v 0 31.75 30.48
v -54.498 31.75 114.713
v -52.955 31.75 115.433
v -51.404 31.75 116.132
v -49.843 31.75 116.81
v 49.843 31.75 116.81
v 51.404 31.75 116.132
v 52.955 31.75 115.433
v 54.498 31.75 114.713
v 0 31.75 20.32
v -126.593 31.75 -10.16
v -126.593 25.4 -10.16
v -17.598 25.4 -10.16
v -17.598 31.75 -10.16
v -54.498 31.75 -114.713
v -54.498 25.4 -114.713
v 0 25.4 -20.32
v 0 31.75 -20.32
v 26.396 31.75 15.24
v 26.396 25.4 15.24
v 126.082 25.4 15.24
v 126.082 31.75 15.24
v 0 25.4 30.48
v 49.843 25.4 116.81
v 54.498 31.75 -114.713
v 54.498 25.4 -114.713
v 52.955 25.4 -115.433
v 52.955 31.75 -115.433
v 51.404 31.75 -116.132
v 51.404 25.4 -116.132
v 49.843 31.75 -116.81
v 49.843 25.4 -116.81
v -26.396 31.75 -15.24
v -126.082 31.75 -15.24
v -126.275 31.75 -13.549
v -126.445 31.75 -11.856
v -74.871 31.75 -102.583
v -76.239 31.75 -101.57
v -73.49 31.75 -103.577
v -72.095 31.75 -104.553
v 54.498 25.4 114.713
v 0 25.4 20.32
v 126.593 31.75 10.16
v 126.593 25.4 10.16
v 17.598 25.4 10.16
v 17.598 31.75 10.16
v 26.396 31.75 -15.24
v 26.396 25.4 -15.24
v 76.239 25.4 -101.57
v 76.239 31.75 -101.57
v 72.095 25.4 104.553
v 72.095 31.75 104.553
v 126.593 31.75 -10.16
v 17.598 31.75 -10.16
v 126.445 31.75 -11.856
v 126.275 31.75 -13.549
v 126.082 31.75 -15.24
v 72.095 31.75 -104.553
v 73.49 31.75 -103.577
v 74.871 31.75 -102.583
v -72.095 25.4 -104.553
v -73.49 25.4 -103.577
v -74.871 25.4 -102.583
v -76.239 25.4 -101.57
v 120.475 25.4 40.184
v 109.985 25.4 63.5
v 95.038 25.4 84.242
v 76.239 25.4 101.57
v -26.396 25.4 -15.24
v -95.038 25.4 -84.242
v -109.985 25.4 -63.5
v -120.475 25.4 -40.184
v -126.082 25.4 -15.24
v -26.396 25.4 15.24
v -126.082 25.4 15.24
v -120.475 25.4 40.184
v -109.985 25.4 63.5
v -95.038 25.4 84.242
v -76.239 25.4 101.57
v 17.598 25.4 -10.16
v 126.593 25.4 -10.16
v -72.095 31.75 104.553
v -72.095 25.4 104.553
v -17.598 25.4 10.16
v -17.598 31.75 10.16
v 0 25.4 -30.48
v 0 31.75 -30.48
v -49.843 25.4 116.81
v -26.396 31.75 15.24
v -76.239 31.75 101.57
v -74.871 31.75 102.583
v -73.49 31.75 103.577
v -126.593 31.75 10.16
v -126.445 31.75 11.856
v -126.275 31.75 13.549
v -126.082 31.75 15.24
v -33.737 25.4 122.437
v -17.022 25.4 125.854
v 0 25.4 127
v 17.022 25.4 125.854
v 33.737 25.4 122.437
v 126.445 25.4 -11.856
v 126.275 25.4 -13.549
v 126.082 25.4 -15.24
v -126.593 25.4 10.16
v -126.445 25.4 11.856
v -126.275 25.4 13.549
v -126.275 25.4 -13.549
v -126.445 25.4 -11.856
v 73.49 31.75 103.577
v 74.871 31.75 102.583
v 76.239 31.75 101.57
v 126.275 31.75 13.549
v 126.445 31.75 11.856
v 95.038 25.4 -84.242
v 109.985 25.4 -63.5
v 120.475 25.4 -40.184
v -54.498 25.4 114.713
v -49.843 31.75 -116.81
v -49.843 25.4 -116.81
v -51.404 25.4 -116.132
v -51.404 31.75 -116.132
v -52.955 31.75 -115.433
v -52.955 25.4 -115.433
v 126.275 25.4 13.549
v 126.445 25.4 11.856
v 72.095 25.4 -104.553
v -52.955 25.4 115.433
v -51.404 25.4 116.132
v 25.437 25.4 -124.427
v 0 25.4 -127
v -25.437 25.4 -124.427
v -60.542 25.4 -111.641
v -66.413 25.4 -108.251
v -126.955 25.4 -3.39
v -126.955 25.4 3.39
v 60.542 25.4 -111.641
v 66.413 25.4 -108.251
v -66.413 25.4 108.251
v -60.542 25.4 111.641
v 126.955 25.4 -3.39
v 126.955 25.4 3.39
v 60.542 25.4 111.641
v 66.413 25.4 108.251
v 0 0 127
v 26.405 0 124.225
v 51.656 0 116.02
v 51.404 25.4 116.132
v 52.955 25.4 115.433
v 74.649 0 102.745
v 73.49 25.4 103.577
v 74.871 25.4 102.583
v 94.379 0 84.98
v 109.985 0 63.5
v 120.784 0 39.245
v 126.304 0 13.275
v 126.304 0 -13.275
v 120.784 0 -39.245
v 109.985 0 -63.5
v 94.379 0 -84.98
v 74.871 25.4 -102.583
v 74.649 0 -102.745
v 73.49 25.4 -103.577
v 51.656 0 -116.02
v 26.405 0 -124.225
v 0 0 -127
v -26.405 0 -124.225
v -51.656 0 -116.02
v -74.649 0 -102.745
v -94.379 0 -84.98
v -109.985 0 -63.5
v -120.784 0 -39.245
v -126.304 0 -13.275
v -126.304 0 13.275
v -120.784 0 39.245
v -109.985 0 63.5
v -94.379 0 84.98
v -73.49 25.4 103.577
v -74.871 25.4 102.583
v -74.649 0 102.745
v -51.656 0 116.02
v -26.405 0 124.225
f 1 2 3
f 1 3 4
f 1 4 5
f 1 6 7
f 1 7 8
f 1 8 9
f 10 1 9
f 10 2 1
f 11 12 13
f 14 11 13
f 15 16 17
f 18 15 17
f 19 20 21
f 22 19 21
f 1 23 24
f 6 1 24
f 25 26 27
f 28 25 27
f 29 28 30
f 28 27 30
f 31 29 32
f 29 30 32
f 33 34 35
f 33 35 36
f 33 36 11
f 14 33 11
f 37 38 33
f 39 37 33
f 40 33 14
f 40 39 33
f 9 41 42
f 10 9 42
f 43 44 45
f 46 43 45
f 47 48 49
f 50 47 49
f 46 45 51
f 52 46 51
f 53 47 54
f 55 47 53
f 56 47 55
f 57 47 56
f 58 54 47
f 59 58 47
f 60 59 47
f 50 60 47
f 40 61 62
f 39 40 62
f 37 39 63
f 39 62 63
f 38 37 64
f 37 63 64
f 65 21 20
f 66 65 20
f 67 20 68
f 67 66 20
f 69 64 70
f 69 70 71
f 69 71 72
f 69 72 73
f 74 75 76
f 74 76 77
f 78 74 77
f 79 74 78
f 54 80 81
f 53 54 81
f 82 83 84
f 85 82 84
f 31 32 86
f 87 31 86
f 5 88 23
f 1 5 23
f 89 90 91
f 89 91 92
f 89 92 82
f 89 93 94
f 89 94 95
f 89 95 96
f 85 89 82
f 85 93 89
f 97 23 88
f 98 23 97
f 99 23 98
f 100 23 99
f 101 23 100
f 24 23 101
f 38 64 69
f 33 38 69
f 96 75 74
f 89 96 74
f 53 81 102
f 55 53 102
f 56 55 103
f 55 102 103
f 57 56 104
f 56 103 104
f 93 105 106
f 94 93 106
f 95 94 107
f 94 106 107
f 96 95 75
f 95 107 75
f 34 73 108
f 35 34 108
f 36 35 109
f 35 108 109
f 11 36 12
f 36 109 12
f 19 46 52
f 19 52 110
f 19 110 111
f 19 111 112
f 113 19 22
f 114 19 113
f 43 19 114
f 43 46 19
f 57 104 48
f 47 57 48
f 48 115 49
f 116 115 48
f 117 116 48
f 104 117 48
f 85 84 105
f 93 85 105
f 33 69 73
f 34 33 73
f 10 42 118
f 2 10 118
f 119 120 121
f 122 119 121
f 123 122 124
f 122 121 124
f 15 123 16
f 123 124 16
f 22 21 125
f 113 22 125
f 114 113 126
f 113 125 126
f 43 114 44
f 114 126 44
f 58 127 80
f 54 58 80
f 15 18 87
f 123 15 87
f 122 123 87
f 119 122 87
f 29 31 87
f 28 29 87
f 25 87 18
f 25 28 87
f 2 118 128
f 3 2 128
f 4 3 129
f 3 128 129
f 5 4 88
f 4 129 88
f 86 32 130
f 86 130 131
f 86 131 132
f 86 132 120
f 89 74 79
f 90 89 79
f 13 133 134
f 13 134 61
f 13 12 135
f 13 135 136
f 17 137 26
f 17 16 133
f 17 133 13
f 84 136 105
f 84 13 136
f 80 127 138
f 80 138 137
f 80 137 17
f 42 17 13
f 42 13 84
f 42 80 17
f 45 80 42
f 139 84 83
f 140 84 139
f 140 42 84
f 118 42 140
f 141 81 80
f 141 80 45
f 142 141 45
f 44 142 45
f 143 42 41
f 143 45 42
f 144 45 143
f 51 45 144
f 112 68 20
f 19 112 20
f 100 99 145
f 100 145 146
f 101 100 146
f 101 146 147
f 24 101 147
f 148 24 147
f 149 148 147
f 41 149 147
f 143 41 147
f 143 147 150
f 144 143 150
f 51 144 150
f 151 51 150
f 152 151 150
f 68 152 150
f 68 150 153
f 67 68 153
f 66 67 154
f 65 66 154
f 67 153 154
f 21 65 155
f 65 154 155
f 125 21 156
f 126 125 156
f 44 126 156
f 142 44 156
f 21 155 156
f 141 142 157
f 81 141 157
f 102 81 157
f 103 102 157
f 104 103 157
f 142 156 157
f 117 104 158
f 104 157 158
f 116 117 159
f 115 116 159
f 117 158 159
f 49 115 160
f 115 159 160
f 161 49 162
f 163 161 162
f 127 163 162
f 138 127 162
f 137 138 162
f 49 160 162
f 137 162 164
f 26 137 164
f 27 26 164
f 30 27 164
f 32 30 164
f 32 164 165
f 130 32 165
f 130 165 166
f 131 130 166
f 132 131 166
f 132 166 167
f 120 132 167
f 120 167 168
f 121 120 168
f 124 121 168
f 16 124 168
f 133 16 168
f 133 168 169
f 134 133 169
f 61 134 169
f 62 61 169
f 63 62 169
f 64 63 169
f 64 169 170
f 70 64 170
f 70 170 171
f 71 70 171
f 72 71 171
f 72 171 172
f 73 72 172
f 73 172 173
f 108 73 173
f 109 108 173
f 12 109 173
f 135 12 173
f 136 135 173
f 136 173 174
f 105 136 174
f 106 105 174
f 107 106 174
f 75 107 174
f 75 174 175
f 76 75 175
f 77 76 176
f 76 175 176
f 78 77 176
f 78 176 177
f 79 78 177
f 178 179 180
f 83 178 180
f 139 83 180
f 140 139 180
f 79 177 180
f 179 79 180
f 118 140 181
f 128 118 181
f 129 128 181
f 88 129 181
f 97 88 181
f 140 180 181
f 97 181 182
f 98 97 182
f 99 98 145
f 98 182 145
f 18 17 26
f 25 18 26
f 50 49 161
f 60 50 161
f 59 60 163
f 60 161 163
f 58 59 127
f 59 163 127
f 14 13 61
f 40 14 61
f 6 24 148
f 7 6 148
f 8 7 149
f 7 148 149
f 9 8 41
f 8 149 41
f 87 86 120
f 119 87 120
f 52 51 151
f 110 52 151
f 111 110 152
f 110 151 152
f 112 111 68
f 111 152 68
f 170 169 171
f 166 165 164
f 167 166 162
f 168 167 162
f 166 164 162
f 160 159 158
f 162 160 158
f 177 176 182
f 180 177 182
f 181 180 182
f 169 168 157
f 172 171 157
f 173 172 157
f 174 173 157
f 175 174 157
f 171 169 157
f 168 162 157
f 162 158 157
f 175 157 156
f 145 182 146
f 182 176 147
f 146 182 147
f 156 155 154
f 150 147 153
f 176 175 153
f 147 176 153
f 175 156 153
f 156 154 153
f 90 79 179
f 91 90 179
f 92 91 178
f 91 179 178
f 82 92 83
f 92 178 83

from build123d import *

# Parameters (mm, degrees)
SKETCH1_R           = 127
BOSS_EXTRUDE1_DEPTH = 25.4
BOSS_EXTRUDE2_DEPTH = 6.35


with BuildPart() as part:
    # Sketch1 → Boss-Extrude1 (new body)
    with BuildSketch(Plane(origin=(0, 0, 0), x_dir=(1, 0, 0), z_dir=(0, 1, 0))):
        with Locations(Location((0, 0, 0), (0, 0, 270))):
            Circle(SKETCH1_R)
    extrude(amount=BOSS_EXTRUDE1_DEPTH)

    # Sketch2 → Boss-Extrude2 (add)
    with BuildSketch(Plane(origin=(0, 25.4, 0), x_dir=(1, 0, 0), z_dir=(0, 1, 0))):
        with BuildLine():
            Line((-126.592947671, 10.16), (-17.597636205, 10.16))
            Line((-17.597636205, 10.16), (-72.095291938, 104.552708623))
            ThreePointArc((-72.095291938, 104.552708623), (-74.182318509, 103.082411791), (-76.239369275, 101.570461122))
            Line((-76.239369275, 101.570461122), (-26.396454307, 15.24))
            Line((-26.396454307, 15.24), (-126.082284243, 15.24))
            ThreePointArc((-126.082284243, 15.24), (-126.363146549, 12.702566445), (-126.592947671, 10.16))
        make_face()
        with BuildLine():
            Line((-126.082284243, -15.24), (-26.396454307, -15.24))
            Line((-26.396454307, -15.24), (-76.239369275, -101.570461122))
            ThreePointArc((-76.239369275, -101.570461122), (-74.182318509, -103.082411791), (-72.095291938, -104.552708623))
            Line((-72.095291938, -104.552708623), (-17.597636205, -10.16))
            Line((-17.597636205, -10.16), (-126.592947671, -10.16))
            ThreePointArc((-126.592947671, -10.16), (-126.363146549, -12.702566445), (-126.082284243, -15.24))
        make_face()
        with BuildLine():
            Line((54.497655733, -114.712708623), (0, -20.32))
            Line((0, -20.32), (-54.497655733, -114.712708623))
            ThreePointArc((-54.497655733, -114.712708623), (-52.18082804, -115.784978236), (-49.842914968, -116.810461122))
            Line((-49.842914968, -116.810461122), (0, -30.48))
            Line((0, -30.48), (49.842914968, -116.810461122))
            ThreePointArc((49.842914968, -116.810461122), (52.18082804, -115.784978236), (54.497655733, -114.712708623))
        make_face()
        with BuildLine():
            Line((76.239369275, -101.570461122), (26.396454307, -15.24))
            Line((26.396454307, -15.24), (126.082284243, -15.24))
            ThreePointArc((126.082284243, -15.24), (126.363146549, -12.702566445), (126.592947671, -10.16))
            Line((126.592947671, -10.16), (17.597636205, -10.16))
            Line((17.597636205, -10.16), (72.095291938, -104.552708623))
            ThreePointArc((72.095291938, -104.552708623), (74.182318509, -103.082411791), (76.239369275, -101.570461122))
        make_face()
        with BuildLine():
            Line((72.095291938, 104.552708623), (17.597636205, 10.16))
            Line((17.597636205, 10.16), (126.592947671, 10.16))
            ThreePointArc((126.592947671, 10.16), (126.363146549, 12.702566445), (126.082284243, 15.24))
            Line((126.082284243, 15.24), (26.396454307, 15.24))
            Line((26.396454307, 15.24), (76.239369275, 101.570461122))
            ThreePointArc((76.239369275, 101.570461122), (74.182318509, 103.082411791), (72.095291938, 104.552708623))
        make_face()
        with BuildLine():
            Line((49.842914968, 116.810461122), (0, 30.48))
            Line((0, 30.48), (-49.842914968, 116.810461122))
            ThreePointArc((-49.842914968, 116.810461122), (-52.18082804, 115.784978236), (-54.497655733, 114.712708623))
            Line((-54.497655733, 114.712708623), (0, 20.32))
            Line((0, 20.32), (54.497655733, 114.712708623))
            ThreePointArc((54.497655733, 114.712708623), (52.18082804, 115.784978236), (49.842914968, 116.810461122))
        make_face()
    extrude(amount=BOSS_EXTRUDE2_DEPTH)


solid = part.part
